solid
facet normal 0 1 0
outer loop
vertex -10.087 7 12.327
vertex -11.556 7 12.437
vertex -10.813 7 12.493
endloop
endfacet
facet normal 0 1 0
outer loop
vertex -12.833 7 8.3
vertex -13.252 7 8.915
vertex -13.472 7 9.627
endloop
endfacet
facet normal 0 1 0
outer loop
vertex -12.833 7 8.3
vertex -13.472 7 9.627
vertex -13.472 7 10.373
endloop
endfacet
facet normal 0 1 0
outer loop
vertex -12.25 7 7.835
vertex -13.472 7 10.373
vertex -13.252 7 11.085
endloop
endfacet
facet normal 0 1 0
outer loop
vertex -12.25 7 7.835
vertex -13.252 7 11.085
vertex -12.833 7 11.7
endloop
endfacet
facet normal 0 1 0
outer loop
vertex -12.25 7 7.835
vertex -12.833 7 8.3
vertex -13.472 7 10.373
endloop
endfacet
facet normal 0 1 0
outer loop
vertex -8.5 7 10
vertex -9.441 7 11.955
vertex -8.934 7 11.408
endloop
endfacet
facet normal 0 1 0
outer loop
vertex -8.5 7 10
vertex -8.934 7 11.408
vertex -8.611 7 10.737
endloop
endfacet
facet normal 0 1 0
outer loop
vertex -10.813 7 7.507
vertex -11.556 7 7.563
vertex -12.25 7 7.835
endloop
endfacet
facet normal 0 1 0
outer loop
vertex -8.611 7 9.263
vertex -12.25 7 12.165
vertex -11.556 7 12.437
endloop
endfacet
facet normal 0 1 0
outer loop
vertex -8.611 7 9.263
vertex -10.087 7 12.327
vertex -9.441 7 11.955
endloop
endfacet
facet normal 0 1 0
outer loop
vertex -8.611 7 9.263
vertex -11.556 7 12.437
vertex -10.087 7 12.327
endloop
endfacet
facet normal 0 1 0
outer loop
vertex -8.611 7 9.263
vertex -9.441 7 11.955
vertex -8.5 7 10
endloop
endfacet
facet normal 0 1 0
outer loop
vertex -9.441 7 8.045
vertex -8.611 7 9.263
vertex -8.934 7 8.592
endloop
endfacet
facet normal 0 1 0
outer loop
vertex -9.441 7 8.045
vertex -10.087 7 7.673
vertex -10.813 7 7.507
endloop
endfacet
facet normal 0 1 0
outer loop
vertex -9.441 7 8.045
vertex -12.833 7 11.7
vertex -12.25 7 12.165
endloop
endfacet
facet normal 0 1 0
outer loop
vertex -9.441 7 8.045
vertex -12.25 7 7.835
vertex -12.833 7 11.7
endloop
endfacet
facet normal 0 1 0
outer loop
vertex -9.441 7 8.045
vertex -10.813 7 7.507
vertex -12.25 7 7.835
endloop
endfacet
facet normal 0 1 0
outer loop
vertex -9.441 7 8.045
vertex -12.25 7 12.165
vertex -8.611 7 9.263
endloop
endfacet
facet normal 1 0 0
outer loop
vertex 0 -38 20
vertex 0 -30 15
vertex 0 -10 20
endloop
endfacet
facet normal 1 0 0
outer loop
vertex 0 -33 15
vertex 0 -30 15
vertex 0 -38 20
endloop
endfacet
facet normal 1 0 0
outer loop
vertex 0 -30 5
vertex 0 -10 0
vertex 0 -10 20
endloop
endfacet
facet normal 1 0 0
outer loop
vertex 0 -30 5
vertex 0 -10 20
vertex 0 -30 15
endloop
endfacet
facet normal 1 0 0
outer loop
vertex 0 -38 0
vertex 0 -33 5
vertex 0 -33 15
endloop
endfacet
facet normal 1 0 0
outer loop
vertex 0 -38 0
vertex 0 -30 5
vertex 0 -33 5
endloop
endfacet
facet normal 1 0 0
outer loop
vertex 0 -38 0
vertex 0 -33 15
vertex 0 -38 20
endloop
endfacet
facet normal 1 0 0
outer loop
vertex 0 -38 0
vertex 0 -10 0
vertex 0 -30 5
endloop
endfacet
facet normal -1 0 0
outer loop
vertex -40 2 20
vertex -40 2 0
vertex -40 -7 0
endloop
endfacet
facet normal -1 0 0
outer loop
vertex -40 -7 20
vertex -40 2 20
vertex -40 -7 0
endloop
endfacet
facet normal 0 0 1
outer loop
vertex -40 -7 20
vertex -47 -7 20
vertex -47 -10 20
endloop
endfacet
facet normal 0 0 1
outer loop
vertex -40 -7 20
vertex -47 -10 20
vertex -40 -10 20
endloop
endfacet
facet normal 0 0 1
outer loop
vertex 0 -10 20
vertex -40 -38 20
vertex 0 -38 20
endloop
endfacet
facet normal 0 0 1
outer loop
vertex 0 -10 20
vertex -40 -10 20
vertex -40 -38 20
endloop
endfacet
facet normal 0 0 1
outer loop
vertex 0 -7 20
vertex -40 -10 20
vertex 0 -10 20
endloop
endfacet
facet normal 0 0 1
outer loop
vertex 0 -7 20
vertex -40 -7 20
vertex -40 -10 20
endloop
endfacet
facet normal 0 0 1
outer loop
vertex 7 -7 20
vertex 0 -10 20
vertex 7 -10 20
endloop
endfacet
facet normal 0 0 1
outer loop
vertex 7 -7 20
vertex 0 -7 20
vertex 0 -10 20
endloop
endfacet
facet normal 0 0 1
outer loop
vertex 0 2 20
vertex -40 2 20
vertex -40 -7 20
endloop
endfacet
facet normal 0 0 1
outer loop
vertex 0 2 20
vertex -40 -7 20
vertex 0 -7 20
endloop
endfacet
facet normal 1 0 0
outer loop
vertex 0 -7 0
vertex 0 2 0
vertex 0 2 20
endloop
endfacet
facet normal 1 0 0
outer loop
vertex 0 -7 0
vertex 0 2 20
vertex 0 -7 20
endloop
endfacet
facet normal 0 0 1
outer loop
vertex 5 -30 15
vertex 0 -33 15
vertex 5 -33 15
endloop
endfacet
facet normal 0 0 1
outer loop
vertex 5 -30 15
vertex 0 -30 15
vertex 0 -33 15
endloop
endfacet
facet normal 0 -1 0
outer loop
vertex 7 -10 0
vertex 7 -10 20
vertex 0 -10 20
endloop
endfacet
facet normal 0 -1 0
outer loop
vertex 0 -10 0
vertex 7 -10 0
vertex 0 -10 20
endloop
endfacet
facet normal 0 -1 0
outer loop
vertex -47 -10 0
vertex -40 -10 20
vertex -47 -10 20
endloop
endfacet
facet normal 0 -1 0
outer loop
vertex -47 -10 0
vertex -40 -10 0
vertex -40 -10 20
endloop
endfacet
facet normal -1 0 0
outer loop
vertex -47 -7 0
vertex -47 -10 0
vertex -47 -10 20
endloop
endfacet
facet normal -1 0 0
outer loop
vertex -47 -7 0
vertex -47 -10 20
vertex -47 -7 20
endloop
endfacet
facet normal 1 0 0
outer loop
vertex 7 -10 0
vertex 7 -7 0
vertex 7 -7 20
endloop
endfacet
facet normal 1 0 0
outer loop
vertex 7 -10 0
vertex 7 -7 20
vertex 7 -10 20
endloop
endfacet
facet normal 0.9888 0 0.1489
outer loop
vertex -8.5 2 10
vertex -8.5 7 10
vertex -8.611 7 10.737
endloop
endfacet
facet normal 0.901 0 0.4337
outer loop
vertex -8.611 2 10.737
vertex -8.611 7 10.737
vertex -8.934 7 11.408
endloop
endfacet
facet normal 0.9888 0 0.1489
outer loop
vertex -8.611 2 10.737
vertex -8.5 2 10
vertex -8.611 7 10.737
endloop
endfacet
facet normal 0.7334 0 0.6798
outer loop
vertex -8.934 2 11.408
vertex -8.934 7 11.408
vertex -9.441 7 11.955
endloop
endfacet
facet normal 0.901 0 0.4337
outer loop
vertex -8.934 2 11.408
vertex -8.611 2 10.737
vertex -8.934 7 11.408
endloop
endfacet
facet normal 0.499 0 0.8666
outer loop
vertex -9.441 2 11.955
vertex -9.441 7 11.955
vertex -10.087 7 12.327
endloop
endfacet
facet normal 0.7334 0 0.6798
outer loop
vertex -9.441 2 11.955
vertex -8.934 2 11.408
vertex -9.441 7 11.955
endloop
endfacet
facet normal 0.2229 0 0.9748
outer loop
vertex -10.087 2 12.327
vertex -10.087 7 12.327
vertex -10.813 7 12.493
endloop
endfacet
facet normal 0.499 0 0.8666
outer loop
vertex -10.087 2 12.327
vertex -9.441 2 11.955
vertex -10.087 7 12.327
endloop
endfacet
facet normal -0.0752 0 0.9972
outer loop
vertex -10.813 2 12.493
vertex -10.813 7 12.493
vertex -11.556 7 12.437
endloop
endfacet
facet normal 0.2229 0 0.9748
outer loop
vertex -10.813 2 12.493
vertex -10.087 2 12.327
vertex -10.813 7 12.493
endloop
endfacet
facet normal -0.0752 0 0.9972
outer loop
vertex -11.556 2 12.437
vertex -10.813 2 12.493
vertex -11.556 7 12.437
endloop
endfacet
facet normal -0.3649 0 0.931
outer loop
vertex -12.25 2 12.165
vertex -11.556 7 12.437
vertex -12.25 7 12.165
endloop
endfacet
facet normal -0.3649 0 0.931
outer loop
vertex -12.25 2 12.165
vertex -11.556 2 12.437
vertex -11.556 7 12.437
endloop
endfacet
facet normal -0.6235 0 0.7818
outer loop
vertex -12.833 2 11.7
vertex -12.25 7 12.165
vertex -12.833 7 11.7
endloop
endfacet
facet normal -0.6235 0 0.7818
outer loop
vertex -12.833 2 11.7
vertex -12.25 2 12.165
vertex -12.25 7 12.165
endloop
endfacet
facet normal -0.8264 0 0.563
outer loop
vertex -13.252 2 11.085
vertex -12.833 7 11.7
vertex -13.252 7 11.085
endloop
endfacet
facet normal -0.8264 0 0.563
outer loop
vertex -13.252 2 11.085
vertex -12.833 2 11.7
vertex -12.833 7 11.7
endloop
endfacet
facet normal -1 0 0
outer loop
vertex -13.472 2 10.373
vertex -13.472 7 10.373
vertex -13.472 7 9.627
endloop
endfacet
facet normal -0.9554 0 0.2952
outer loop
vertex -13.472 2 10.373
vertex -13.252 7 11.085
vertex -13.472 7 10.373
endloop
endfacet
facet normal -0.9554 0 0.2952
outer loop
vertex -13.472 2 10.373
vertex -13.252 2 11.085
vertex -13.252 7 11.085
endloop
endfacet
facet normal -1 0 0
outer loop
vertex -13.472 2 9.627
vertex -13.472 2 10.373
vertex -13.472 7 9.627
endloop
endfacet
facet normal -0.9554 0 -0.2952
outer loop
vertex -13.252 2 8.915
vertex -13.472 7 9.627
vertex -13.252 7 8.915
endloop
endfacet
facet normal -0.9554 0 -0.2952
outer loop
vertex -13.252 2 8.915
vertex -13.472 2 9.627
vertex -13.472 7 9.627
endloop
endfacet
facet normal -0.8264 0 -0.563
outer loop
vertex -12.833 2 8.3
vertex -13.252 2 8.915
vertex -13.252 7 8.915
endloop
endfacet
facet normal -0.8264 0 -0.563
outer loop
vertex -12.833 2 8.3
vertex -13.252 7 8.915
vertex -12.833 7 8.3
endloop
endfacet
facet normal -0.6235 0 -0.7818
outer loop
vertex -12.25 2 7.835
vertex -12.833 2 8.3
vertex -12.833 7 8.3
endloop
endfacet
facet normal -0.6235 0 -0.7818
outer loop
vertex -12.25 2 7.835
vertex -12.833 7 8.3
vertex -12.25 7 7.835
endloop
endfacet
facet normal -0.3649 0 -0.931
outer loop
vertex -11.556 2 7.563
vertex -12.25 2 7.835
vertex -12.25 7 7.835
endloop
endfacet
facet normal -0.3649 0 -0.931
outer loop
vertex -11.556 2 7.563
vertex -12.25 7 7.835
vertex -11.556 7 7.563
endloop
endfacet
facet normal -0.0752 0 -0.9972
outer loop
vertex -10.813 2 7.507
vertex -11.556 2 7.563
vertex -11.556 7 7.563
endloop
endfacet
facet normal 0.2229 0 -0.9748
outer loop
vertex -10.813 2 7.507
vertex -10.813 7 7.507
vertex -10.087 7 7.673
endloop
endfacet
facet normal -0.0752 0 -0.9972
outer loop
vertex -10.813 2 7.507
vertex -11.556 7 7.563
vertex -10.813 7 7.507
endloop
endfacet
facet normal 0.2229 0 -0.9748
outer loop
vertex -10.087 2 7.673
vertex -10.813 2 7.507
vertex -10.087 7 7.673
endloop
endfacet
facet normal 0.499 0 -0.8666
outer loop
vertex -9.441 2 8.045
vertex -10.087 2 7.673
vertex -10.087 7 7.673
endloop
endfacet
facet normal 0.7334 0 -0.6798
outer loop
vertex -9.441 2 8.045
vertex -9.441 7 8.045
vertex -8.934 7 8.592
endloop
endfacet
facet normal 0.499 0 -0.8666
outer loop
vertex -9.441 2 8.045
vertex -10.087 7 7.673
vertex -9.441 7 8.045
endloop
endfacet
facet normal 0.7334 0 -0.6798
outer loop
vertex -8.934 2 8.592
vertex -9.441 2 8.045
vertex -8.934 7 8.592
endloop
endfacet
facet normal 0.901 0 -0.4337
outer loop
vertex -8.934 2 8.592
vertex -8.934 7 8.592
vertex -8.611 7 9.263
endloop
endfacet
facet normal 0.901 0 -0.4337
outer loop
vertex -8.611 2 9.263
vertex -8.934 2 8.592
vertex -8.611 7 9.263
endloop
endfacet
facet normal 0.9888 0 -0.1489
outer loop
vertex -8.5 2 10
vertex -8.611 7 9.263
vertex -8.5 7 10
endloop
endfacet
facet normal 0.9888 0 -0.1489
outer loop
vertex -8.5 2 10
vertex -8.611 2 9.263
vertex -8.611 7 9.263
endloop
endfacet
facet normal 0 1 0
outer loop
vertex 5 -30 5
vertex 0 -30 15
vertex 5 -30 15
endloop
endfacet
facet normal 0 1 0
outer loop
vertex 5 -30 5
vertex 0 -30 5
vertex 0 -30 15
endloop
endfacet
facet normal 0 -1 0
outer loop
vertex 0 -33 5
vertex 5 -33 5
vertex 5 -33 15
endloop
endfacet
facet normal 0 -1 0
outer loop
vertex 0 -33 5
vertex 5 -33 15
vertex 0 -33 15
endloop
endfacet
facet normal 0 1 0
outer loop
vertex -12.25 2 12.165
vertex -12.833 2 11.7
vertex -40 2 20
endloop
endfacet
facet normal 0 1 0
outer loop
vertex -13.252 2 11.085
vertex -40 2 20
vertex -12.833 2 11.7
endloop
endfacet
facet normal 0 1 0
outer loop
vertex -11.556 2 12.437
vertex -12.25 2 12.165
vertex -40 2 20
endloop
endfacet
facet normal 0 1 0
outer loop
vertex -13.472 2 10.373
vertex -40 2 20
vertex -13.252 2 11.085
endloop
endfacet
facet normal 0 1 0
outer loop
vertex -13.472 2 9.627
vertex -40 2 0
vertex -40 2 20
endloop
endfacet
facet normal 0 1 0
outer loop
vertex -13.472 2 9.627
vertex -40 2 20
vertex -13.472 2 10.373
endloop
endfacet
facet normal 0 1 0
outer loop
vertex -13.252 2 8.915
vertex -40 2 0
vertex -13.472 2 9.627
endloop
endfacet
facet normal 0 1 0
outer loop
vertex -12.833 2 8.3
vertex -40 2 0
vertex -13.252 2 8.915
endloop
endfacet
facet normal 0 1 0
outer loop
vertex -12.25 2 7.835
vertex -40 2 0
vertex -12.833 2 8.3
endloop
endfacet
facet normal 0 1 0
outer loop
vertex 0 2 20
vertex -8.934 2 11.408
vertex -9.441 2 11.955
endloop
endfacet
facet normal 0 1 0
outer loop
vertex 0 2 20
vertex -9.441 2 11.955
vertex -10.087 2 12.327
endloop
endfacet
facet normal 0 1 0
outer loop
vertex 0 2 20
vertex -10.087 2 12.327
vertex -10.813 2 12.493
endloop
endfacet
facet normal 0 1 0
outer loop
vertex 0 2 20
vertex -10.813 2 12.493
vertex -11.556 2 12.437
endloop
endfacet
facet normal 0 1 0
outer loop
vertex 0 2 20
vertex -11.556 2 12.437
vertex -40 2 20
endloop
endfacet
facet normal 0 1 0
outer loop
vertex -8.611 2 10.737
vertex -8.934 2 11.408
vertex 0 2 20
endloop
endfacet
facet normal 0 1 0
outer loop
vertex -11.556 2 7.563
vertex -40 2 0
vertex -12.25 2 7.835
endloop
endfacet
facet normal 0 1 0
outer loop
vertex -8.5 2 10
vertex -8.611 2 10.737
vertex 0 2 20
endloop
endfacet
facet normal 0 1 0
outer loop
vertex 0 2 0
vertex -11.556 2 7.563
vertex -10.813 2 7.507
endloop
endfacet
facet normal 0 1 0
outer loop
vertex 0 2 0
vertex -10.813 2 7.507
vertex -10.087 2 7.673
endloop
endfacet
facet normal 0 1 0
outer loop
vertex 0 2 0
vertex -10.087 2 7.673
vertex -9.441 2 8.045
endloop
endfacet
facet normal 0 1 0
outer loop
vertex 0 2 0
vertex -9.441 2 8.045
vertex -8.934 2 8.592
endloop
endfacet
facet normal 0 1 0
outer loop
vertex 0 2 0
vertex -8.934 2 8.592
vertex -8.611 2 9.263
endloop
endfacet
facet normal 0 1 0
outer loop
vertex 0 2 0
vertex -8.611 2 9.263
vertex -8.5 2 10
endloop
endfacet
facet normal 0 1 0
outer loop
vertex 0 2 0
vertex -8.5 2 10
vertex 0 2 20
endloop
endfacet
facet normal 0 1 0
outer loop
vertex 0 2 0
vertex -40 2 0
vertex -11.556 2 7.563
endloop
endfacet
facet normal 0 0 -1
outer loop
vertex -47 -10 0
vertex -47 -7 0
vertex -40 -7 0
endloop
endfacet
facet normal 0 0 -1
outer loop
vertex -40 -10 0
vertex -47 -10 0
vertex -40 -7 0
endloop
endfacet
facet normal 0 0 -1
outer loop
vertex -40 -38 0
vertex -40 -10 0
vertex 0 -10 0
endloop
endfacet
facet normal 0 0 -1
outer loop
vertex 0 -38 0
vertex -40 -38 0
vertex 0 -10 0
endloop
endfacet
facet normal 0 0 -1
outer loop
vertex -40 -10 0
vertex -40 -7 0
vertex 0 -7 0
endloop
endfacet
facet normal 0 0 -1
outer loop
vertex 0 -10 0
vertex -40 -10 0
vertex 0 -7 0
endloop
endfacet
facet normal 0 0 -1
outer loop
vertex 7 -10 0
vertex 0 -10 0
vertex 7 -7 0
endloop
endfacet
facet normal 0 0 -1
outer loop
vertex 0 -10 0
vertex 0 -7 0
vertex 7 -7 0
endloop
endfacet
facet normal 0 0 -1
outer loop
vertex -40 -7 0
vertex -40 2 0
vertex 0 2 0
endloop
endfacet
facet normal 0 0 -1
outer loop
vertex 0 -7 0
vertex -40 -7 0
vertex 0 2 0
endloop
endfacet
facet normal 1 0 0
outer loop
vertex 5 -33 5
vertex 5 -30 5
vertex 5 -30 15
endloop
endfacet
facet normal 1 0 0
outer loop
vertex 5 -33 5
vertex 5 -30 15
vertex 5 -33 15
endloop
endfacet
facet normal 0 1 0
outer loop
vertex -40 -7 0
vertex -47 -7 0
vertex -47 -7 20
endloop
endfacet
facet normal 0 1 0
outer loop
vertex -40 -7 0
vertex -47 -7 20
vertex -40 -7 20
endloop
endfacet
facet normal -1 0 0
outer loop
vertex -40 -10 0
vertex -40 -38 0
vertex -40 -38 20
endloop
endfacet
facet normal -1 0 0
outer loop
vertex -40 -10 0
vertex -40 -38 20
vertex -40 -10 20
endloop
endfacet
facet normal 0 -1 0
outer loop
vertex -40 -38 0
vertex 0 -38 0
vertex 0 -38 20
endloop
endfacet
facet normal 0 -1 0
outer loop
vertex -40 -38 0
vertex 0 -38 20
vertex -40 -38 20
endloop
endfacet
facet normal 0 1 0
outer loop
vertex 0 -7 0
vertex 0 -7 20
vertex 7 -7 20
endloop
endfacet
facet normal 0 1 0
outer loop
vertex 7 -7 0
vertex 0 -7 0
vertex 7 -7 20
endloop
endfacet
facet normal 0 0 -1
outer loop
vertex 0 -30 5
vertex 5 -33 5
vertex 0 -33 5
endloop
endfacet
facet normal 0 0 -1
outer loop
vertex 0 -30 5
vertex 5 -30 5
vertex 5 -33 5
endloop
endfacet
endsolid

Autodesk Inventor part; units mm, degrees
ref_plane "YZ Plane" through (0, 0, 0) normal (1, 0, 0) x (0, 1, 0)
ref_plane "XZ Plane" through (0, 0, 0) normal (0, 1, 0) x (-1, 0, 0)
sketch "Sketch1" plane through (0, 0, 0) normal (0, 0, 1) x (1, 0, 0)
  line L0 (-40, 0) -> (0, 0)
  line L1 (0, 0) -> (0, -7)
  line L2 (0, -7) -> (7, -7)
  line L3 (7, -7) -> (7, -10)
  line L4 (7, -10) -> (0, -10)
  line L5 (0, -10) -> (0, -30)
  line L6 (0, -38) -> (-40, -38)
  line L7 (-40, -38) -> (-40, -10)
  line L8 (-40, -10) -> (-47, -10)
  line L9 (-47, -10) -> (-47, -7)
  line L10 (-47, -7) -> (-40, -7)
  line L11 (-40, 0) -> (-40, -7)
  line L12 (0, -30) -> (5, -30)
  line L13 (5, -30) -> (5, -33)
  line L14 (5, -33) -> (0, -33)
  line L15 (0, -30) -> (0, -33) construction
  line L16 (0, -33) -> (0, -38)
  point P0 (7, -8.5)
  point P1 (-47, -8.5)
  point P2 (0, -24)
  dimension "d1" = 38
  dimension "d2" = 54
  dimension "d4" = 40
  dimension "d5" = 28
  dimension "d6" = 7
  dimension "d7" = 3
  dimension "d17" = 3
  dimension "d18" = 5
  dimension "d19" = 5
extrude "Extrusion1" add sketch "Sketch1" along normal blind 20
sketch "Sketch2" plane through (-40, 0, 0) normal (0, 1, 0) x (1, 0, 0)
  circle A0 centre (29, -10) radius 2.5
  line L0 (-7, 0) -> (-7, -20) projected
  line L1 (40, 0) -> (40, -20) projected
  line L2 (40, -10) -> (0, -10) construction
  line L3 (0, 0) -> (0, -20) projected
  line L4 (40, 0) -> (0, 0) projected
  line L5 (0, 0) -> (0, -20) projected
  line L6 (40, -20) -> (0, -20) projected
  line L7 (40, 0) -> (40, -20) projected
  dimension "d11" = 5
  dimension "d12" = 36
extrude "Extrusion2" add sketch "Sketch2" along normal blind 2 contours A0 | L1 L6 L3 L4
extrude "Extrusion3" add sketch "Sketch2" along normal blind 7 contours A0
sketch "Sketch3" plane through (0, -30, 0) normal (0, 1, 0) x (1, 0, 0)
  line L0 (5, 0) -> (0, 0) projected
  line L1 (0, 0) -> (0, -20) projected
  line L2 (5, -20) -> (0, -20) projected
  line L3 (5, 0) -> (5, -20) projected
  line L4 (0, 0) -> (0, -20) projected
  line L5 (5, 0) -> (5, -20) projected
  line L6 (0, -15) -> (5, -15)
  line L7 (5, -15) -> (5, -5)
  line L8 (5, -5) -> (0, -5)
  line L9 (0, -5) -> (0, -15)
  point P0 (0, -5)
  point P1 (5, -5)
  dimension "d20" = 5
  dimension "d21" = 5
extrude "Extrusion4" cut sketch "Sketch3" against normal through all contours L3 L8 L1 L0 | L3 L2 L1 L6
ref_plane "Work Plane1" through (0, 0, 10) normal (0, 0, 1) x (1, 0, 0)
properties part number "Servo_bigg_maketa"
